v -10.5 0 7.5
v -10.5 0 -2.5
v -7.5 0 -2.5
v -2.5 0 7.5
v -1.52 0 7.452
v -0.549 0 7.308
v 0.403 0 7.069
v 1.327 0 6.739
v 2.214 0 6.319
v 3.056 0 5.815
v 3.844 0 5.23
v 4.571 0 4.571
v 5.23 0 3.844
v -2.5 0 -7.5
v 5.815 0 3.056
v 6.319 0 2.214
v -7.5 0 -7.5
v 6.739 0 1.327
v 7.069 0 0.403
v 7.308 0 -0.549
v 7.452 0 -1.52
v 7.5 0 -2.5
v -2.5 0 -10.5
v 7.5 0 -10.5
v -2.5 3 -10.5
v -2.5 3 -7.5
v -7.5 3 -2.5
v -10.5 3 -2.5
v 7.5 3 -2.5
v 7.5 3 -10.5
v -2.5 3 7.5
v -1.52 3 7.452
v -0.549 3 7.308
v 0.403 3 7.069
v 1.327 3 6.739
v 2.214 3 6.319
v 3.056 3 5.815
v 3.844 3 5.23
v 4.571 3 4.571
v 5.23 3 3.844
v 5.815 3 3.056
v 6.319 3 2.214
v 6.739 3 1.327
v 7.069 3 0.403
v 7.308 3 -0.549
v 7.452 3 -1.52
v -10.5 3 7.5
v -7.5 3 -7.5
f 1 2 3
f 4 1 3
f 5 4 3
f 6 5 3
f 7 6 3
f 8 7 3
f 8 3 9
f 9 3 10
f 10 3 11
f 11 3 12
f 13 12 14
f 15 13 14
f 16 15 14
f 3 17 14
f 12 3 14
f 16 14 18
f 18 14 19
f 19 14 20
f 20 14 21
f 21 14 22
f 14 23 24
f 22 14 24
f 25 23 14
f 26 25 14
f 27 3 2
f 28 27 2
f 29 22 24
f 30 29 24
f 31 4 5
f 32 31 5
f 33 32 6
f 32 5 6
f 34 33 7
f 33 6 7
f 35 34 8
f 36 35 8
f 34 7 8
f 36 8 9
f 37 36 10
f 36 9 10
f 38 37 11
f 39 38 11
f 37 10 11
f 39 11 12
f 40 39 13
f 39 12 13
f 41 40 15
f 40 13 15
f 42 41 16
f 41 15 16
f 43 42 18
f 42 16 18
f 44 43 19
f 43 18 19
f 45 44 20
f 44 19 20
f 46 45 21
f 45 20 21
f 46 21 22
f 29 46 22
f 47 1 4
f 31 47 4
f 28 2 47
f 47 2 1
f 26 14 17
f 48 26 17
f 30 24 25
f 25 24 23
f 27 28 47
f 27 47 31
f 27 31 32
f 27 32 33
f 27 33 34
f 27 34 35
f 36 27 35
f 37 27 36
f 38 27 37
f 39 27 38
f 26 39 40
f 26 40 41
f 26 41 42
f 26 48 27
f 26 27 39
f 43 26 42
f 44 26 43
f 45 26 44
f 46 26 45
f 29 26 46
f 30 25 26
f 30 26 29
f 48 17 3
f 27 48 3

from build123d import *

# Parameters (mm, degrees)
BOSS_EXTRUDE1_DEPTH = 3


with BuildPart() as part:
    # Sketch1 → Boss-Extrude1 (new body)
    with BuildSketch(Plane(origin=(0, 0, 0), x_dir=(1, 0, 0), z_dir=(0, 1, 0))):
        with BuildLine():
            Line((-7.5, 2.5), (-10.5, 2.5))
            Line((-10.5, 2.5), (-10.5, -7.5))
            Line((-10.5, -7.5), (-7.5, -7.5))
            Line((-7.5, -7.5), (-2.5, -7.5))
            ThreePointArc((-2.5, -7.5), (4.571067812, -4.571067812), (7.5, 2.5))
            Line((7.5, 2.5), (7.5, 7.5))
            Line((7.5, 7.5), (7.5, 10.5))
            Line((7.5, 10.5), (-2.5, 10.5))
            Line((-2.5, 10.5), (-2.5, 7.5))
            Line((-2.5, 7.5), (-7.5, 7.5))
            Line((-7.5, 7.5), (-7.5, 2.5))
        make_face()
    extrude(amount=BOSS_EXTRUDE1_DEPTH)


solid = part.part
